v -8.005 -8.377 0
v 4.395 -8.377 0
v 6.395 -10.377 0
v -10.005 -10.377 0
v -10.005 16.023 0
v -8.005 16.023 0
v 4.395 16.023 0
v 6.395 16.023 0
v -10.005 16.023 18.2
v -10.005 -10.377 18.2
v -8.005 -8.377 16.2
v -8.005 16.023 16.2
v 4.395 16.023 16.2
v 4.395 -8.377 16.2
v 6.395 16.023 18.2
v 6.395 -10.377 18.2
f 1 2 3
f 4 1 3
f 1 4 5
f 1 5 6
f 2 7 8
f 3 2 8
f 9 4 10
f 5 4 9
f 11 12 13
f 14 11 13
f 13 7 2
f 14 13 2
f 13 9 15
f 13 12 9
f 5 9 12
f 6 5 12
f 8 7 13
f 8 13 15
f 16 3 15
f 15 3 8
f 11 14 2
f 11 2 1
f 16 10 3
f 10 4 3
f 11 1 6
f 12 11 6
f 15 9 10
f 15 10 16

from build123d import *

# Parameters (mm, degrees)
EXTRUDE_1_DEPTH = 16.2
SKETCH_4_W      = 16.4
SKETCH_4_H      = 26.4
EXTRUDE_2_DEPTH = 2


with BuildPart() as part:
    # 草图1 → 凸台-拉伸1 (new body)
    with BuildSketch(Plane.XY):
        Polygon((-8.004506799, -8.377067037), (-8.004506799, 14.022932963), (-8.004506799, 16.022932963), (-10.004506799, 16.022932963), (-10.004506799, 14.022932963), (-10.004506799, -10.377067037), (6.395493201, -10.377067037), (6.395493201, 14.022932963), (6.395493201, 16.022932963), (4.395493201, 16.022932963), (4.395493201, 14.022932963), (4.395493201, -8.377067037), align=None)
    extrude(amount=EXTRUDE_1_DEPTH)

    # 草图4 → 凸台-拉伸2 (add)
    with BuildSketch(Plane.XY.offset(16.2)):
        with Locations((-1.804506799, 2.822932963)):
            Rectangle(SKETCH_4_W, SKETCH_4_H)
    extrude(amount=EXTRUDE_2_DEPTH)


solid = part.part
